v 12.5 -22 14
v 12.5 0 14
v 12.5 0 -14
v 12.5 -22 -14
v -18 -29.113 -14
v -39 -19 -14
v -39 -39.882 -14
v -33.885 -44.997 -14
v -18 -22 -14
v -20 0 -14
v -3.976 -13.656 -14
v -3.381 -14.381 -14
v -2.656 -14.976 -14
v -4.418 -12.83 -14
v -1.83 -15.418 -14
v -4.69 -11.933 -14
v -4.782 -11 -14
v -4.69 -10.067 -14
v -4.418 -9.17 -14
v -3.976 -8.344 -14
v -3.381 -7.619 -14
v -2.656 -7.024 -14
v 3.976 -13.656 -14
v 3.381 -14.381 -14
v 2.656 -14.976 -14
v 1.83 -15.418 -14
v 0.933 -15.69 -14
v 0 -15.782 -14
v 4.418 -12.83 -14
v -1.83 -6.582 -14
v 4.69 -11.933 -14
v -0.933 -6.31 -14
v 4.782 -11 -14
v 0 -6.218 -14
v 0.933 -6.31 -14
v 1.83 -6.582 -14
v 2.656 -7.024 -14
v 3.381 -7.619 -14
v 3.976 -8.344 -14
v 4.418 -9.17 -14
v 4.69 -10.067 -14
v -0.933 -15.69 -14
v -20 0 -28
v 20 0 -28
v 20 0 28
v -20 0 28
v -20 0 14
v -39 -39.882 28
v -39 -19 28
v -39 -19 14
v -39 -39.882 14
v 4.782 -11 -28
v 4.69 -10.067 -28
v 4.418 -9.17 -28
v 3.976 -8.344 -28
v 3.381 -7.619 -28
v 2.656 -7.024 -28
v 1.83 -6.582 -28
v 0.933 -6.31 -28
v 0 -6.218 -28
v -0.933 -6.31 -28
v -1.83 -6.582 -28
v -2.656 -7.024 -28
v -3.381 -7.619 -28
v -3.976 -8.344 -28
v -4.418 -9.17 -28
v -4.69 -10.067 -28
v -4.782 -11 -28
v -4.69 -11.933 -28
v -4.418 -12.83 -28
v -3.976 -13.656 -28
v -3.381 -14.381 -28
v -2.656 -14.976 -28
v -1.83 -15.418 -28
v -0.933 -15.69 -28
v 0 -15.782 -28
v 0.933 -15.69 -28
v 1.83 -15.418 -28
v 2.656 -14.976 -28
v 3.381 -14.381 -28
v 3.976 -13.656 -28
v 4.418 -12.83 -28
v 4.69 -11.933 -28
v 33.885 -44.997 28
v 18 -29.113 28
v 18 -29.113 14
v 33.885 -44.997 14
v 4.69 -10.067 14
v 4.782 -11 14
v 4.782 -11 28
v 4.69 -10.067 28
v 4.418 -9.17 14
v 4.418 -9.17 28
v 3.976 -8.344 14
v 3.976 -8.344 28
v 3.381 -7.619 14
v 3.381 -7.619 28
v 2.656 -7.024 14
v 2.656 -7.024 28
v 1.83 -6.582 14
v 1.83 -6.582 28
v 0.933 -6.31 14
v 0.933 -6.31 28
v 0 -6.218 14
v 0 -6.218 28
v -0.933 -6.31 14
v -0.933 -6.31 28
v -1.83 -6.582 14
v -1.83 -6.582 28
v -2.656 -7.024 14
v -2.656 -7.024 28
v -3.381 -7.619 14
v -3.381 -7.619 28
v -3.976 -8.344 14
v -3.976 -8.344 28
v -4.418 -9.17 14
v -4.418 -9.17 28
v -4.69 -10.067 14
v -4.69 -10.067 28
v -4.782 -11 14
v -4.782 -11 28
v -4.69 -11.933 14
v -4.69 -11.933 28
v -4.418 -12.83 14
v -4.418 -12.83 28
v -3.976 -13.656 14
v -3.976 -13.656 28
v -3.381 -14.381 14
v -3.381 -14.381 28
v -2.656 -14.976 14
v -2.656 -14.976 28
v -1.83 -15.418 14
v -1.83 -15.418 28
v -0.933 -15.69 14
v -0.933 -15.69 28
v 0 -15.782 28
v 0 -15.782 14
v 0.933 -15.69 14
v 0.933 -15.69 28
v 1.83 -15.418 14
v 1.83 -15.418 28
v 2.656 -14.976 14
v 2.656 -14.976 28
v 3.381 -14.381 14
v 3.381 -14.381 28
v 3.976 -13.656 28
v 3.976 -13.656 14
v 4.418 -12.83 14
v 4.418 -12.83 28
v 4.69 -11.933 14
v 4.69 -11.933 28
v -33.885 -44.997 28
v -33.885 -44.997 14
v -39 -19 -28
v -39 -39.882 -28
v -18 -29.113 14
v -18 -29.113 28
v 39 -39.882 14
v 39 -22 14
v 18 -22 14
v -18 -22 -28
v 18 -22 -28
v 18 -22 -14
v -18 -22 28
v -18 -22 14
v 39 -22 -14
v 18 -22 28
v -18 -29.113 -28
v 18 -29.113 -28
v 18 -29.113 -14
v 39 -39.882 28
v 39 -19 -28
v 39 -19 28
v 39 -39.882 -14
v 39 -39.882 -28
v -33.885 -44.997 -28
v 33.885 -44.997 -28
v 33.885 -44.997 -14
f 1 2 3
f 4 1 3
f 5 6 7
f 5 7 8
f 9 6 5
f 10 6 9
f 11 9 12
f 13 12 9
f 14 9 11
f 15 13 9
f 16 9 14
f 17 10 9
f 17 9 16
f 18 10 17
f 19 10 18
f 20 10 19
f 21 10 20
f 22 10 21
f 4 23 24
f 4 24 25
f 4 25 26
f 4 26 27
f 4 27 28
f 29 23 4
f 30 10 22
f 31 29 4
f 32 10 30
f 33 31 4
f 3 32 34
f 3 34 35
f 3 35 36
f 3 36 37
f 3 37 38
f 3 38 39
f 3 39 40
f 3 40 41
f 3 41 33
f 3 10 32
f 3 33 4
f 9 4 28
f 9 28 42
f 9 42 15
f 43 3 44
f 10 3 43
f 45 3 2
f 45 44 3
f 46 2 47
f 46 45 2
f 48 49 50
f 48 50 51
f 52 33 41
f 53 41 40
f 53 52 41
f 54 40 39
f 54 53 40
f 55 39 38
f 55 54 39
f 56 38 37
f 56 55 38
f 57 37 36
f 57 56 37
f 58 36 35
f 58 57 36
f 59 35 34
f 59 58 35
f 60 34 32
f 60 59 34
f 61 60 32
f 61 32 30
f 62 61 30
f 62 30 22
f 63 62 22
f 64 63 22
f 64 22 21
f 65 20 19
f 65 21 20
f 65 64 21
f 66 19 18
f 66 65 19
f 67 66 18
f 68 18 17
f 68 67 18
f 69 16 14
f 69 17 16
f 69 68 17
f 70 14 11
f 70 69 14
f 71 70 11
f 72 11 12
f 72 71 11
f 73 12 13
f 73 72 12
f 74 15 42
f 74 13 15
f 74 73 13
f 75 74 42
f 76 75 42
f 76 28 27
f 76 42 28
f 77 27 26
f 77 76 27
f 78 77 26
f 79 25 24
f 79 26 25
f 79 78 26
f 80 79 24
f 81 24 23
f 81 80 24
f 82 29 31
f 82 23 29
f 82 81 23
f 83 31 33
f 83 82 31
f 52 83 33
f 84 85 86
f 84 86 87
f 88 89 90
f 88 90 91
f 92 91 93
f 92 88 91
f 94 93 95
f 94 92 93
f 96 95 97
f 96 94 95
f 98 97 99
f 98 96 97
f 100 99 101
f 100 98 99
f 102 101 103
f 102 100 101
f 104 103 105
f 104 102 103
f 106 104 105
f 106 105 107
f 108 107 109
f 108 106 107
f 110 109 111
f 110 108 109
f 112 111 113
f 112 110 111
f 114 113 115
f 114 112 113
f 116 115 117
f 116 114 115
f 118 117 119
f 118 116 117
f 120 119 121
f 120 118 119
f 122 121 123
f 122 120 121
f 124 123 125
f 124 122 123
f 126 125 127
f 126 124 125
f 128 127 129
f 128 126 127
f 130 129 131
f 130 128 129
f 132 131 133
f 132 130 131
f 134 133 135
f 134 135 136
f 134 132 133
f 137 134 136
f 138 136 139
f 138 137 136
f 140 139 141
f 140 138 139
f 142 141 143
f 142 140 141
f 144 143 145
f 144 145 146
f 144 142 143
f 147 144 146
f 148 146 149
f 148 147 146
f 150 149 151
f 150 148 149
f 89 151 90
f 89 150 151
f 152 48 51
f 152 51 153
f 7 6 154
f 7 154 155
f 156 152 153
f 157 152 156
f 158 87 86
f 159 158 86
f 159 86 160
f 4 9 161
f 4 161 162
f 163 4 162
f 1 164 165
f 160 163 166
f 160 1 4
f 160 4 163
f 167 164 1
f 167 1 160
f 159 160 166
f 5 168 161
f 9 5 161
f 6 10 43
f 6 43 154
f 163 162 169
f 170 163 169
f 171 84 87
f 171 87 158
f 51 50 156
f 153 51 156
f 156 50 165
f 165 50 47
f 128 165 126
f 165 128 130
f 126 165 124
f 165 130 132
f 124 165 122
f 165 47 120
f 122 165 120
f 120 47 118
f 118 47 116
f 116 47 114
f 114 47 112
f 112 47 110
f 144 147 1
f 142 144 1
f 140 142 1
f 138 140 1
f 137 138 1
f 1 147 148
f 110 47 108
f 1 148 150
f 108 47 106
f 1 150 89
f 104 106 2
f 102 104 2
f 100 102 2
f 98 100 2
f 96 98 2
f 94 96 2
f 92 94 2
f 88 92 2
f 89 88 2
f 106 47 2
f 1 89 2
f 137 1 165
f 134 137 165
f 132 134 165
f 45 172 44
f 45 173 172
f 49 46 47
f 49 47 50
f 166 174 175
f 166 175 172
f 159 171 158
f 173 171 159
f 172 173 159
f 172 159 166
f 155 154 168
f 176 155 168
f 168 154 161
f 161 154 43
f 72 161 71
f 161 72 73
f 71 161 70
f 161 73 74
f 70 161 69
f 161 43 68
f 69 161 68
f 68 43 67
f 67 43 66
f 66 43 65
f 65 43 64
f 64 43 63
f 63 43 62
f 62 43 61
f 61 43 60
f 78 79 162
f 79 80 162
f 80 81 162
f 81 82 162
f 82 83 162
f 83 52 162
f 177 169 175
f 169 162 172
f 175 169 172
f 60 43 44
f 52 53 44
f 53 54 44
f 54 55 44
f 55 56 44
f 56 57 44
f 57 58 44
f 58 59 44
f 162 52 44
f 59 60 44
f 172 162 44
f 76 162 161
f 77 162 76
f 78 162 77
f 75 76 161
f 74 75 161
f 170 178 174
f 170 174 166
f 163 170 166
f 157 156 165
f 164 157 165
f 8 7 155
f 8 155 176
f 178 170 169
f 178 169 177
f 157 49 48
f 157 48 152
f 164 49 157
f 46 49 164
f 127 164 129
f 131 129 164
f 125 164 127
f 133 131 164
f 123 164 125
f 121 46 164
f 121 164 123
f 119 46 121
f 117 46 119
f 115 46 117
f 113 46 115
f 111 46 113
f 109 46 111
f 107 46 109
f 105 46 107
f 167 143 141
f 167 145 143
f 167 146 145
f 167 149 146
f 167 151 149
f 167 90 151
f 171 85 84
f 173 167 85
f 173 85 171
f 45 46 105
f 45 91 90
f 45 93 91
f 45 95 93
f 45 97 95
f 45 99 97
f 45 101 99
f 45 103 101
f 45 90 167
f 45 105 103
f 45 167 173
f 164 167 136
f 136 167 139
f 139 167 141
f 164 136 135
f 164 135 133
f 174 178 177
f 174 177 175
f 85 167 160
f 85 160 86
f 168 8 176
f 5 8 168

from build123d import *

# Parameters (mm, degrees)
SKETCH_1_R          = 4.781543069
EXTRUDE_1_DEPTH     = 28
SKETCH_2_W          = 51.5
SKETCH_2_H          = 28
CUT_EXTRUDE_1_DEPTH = 45.997474683
SKETCH_3_W          = 28
SKETCH_3_H          = 23.235817225
CUT_EXTRUDE_2_DEPTH = 27.5


with BuildPart() as part:
    # 草图1 → 凸台-拉伸1 (new body, symmetric)
    with BuildSketch(Plane.XY):
        Polygon((0, 0), (-20, 0), (-39, -19), (-39, -39.882250994), (-33.884776311, -44.997474683), (-18, -29.112698372), (-18, -22), (18, -22), (18, -29.112698372), (33.884776311, -44.997474683), (39, -39.882250994), (39, -19), (20, 0), align=None)
        with Locations((0, -11)):
            Circle(SKETCH_1_R, mode=Mode.SUBTRACT)
    extrude(amount=EXTRUDE_1_DEPTH, both=True)

    # 草图2 → 切除-拉伸1 (cut, through all)
    with BuildSketch(Plane(origin=(0, 0, 0), x_dir=(1, 0, 0), z_dir=(0, 1, 0))):
        with Locations((-13.25, 0)):
            Rectangle(SKETCH_2_W, SKETCH_2_H)
    extrude(amount=-CUT_EXTRUDE_1_DEPTH, mode=Mode.SUBTRACT)

    # 草图3 → 切除-拉伸2 (cut, through all)
    with BuildSketch(Plane.ZY.offset(-12.5)):
        with Locations((0, -33.617908613)):
            Rectangle(SKETCH_3_W, SKETCH_3_H)
    extrude(amount=-CUT_EXTRUDE_2_DEPTH, mode=Mode.SUBTRACT)


solid = part.part
